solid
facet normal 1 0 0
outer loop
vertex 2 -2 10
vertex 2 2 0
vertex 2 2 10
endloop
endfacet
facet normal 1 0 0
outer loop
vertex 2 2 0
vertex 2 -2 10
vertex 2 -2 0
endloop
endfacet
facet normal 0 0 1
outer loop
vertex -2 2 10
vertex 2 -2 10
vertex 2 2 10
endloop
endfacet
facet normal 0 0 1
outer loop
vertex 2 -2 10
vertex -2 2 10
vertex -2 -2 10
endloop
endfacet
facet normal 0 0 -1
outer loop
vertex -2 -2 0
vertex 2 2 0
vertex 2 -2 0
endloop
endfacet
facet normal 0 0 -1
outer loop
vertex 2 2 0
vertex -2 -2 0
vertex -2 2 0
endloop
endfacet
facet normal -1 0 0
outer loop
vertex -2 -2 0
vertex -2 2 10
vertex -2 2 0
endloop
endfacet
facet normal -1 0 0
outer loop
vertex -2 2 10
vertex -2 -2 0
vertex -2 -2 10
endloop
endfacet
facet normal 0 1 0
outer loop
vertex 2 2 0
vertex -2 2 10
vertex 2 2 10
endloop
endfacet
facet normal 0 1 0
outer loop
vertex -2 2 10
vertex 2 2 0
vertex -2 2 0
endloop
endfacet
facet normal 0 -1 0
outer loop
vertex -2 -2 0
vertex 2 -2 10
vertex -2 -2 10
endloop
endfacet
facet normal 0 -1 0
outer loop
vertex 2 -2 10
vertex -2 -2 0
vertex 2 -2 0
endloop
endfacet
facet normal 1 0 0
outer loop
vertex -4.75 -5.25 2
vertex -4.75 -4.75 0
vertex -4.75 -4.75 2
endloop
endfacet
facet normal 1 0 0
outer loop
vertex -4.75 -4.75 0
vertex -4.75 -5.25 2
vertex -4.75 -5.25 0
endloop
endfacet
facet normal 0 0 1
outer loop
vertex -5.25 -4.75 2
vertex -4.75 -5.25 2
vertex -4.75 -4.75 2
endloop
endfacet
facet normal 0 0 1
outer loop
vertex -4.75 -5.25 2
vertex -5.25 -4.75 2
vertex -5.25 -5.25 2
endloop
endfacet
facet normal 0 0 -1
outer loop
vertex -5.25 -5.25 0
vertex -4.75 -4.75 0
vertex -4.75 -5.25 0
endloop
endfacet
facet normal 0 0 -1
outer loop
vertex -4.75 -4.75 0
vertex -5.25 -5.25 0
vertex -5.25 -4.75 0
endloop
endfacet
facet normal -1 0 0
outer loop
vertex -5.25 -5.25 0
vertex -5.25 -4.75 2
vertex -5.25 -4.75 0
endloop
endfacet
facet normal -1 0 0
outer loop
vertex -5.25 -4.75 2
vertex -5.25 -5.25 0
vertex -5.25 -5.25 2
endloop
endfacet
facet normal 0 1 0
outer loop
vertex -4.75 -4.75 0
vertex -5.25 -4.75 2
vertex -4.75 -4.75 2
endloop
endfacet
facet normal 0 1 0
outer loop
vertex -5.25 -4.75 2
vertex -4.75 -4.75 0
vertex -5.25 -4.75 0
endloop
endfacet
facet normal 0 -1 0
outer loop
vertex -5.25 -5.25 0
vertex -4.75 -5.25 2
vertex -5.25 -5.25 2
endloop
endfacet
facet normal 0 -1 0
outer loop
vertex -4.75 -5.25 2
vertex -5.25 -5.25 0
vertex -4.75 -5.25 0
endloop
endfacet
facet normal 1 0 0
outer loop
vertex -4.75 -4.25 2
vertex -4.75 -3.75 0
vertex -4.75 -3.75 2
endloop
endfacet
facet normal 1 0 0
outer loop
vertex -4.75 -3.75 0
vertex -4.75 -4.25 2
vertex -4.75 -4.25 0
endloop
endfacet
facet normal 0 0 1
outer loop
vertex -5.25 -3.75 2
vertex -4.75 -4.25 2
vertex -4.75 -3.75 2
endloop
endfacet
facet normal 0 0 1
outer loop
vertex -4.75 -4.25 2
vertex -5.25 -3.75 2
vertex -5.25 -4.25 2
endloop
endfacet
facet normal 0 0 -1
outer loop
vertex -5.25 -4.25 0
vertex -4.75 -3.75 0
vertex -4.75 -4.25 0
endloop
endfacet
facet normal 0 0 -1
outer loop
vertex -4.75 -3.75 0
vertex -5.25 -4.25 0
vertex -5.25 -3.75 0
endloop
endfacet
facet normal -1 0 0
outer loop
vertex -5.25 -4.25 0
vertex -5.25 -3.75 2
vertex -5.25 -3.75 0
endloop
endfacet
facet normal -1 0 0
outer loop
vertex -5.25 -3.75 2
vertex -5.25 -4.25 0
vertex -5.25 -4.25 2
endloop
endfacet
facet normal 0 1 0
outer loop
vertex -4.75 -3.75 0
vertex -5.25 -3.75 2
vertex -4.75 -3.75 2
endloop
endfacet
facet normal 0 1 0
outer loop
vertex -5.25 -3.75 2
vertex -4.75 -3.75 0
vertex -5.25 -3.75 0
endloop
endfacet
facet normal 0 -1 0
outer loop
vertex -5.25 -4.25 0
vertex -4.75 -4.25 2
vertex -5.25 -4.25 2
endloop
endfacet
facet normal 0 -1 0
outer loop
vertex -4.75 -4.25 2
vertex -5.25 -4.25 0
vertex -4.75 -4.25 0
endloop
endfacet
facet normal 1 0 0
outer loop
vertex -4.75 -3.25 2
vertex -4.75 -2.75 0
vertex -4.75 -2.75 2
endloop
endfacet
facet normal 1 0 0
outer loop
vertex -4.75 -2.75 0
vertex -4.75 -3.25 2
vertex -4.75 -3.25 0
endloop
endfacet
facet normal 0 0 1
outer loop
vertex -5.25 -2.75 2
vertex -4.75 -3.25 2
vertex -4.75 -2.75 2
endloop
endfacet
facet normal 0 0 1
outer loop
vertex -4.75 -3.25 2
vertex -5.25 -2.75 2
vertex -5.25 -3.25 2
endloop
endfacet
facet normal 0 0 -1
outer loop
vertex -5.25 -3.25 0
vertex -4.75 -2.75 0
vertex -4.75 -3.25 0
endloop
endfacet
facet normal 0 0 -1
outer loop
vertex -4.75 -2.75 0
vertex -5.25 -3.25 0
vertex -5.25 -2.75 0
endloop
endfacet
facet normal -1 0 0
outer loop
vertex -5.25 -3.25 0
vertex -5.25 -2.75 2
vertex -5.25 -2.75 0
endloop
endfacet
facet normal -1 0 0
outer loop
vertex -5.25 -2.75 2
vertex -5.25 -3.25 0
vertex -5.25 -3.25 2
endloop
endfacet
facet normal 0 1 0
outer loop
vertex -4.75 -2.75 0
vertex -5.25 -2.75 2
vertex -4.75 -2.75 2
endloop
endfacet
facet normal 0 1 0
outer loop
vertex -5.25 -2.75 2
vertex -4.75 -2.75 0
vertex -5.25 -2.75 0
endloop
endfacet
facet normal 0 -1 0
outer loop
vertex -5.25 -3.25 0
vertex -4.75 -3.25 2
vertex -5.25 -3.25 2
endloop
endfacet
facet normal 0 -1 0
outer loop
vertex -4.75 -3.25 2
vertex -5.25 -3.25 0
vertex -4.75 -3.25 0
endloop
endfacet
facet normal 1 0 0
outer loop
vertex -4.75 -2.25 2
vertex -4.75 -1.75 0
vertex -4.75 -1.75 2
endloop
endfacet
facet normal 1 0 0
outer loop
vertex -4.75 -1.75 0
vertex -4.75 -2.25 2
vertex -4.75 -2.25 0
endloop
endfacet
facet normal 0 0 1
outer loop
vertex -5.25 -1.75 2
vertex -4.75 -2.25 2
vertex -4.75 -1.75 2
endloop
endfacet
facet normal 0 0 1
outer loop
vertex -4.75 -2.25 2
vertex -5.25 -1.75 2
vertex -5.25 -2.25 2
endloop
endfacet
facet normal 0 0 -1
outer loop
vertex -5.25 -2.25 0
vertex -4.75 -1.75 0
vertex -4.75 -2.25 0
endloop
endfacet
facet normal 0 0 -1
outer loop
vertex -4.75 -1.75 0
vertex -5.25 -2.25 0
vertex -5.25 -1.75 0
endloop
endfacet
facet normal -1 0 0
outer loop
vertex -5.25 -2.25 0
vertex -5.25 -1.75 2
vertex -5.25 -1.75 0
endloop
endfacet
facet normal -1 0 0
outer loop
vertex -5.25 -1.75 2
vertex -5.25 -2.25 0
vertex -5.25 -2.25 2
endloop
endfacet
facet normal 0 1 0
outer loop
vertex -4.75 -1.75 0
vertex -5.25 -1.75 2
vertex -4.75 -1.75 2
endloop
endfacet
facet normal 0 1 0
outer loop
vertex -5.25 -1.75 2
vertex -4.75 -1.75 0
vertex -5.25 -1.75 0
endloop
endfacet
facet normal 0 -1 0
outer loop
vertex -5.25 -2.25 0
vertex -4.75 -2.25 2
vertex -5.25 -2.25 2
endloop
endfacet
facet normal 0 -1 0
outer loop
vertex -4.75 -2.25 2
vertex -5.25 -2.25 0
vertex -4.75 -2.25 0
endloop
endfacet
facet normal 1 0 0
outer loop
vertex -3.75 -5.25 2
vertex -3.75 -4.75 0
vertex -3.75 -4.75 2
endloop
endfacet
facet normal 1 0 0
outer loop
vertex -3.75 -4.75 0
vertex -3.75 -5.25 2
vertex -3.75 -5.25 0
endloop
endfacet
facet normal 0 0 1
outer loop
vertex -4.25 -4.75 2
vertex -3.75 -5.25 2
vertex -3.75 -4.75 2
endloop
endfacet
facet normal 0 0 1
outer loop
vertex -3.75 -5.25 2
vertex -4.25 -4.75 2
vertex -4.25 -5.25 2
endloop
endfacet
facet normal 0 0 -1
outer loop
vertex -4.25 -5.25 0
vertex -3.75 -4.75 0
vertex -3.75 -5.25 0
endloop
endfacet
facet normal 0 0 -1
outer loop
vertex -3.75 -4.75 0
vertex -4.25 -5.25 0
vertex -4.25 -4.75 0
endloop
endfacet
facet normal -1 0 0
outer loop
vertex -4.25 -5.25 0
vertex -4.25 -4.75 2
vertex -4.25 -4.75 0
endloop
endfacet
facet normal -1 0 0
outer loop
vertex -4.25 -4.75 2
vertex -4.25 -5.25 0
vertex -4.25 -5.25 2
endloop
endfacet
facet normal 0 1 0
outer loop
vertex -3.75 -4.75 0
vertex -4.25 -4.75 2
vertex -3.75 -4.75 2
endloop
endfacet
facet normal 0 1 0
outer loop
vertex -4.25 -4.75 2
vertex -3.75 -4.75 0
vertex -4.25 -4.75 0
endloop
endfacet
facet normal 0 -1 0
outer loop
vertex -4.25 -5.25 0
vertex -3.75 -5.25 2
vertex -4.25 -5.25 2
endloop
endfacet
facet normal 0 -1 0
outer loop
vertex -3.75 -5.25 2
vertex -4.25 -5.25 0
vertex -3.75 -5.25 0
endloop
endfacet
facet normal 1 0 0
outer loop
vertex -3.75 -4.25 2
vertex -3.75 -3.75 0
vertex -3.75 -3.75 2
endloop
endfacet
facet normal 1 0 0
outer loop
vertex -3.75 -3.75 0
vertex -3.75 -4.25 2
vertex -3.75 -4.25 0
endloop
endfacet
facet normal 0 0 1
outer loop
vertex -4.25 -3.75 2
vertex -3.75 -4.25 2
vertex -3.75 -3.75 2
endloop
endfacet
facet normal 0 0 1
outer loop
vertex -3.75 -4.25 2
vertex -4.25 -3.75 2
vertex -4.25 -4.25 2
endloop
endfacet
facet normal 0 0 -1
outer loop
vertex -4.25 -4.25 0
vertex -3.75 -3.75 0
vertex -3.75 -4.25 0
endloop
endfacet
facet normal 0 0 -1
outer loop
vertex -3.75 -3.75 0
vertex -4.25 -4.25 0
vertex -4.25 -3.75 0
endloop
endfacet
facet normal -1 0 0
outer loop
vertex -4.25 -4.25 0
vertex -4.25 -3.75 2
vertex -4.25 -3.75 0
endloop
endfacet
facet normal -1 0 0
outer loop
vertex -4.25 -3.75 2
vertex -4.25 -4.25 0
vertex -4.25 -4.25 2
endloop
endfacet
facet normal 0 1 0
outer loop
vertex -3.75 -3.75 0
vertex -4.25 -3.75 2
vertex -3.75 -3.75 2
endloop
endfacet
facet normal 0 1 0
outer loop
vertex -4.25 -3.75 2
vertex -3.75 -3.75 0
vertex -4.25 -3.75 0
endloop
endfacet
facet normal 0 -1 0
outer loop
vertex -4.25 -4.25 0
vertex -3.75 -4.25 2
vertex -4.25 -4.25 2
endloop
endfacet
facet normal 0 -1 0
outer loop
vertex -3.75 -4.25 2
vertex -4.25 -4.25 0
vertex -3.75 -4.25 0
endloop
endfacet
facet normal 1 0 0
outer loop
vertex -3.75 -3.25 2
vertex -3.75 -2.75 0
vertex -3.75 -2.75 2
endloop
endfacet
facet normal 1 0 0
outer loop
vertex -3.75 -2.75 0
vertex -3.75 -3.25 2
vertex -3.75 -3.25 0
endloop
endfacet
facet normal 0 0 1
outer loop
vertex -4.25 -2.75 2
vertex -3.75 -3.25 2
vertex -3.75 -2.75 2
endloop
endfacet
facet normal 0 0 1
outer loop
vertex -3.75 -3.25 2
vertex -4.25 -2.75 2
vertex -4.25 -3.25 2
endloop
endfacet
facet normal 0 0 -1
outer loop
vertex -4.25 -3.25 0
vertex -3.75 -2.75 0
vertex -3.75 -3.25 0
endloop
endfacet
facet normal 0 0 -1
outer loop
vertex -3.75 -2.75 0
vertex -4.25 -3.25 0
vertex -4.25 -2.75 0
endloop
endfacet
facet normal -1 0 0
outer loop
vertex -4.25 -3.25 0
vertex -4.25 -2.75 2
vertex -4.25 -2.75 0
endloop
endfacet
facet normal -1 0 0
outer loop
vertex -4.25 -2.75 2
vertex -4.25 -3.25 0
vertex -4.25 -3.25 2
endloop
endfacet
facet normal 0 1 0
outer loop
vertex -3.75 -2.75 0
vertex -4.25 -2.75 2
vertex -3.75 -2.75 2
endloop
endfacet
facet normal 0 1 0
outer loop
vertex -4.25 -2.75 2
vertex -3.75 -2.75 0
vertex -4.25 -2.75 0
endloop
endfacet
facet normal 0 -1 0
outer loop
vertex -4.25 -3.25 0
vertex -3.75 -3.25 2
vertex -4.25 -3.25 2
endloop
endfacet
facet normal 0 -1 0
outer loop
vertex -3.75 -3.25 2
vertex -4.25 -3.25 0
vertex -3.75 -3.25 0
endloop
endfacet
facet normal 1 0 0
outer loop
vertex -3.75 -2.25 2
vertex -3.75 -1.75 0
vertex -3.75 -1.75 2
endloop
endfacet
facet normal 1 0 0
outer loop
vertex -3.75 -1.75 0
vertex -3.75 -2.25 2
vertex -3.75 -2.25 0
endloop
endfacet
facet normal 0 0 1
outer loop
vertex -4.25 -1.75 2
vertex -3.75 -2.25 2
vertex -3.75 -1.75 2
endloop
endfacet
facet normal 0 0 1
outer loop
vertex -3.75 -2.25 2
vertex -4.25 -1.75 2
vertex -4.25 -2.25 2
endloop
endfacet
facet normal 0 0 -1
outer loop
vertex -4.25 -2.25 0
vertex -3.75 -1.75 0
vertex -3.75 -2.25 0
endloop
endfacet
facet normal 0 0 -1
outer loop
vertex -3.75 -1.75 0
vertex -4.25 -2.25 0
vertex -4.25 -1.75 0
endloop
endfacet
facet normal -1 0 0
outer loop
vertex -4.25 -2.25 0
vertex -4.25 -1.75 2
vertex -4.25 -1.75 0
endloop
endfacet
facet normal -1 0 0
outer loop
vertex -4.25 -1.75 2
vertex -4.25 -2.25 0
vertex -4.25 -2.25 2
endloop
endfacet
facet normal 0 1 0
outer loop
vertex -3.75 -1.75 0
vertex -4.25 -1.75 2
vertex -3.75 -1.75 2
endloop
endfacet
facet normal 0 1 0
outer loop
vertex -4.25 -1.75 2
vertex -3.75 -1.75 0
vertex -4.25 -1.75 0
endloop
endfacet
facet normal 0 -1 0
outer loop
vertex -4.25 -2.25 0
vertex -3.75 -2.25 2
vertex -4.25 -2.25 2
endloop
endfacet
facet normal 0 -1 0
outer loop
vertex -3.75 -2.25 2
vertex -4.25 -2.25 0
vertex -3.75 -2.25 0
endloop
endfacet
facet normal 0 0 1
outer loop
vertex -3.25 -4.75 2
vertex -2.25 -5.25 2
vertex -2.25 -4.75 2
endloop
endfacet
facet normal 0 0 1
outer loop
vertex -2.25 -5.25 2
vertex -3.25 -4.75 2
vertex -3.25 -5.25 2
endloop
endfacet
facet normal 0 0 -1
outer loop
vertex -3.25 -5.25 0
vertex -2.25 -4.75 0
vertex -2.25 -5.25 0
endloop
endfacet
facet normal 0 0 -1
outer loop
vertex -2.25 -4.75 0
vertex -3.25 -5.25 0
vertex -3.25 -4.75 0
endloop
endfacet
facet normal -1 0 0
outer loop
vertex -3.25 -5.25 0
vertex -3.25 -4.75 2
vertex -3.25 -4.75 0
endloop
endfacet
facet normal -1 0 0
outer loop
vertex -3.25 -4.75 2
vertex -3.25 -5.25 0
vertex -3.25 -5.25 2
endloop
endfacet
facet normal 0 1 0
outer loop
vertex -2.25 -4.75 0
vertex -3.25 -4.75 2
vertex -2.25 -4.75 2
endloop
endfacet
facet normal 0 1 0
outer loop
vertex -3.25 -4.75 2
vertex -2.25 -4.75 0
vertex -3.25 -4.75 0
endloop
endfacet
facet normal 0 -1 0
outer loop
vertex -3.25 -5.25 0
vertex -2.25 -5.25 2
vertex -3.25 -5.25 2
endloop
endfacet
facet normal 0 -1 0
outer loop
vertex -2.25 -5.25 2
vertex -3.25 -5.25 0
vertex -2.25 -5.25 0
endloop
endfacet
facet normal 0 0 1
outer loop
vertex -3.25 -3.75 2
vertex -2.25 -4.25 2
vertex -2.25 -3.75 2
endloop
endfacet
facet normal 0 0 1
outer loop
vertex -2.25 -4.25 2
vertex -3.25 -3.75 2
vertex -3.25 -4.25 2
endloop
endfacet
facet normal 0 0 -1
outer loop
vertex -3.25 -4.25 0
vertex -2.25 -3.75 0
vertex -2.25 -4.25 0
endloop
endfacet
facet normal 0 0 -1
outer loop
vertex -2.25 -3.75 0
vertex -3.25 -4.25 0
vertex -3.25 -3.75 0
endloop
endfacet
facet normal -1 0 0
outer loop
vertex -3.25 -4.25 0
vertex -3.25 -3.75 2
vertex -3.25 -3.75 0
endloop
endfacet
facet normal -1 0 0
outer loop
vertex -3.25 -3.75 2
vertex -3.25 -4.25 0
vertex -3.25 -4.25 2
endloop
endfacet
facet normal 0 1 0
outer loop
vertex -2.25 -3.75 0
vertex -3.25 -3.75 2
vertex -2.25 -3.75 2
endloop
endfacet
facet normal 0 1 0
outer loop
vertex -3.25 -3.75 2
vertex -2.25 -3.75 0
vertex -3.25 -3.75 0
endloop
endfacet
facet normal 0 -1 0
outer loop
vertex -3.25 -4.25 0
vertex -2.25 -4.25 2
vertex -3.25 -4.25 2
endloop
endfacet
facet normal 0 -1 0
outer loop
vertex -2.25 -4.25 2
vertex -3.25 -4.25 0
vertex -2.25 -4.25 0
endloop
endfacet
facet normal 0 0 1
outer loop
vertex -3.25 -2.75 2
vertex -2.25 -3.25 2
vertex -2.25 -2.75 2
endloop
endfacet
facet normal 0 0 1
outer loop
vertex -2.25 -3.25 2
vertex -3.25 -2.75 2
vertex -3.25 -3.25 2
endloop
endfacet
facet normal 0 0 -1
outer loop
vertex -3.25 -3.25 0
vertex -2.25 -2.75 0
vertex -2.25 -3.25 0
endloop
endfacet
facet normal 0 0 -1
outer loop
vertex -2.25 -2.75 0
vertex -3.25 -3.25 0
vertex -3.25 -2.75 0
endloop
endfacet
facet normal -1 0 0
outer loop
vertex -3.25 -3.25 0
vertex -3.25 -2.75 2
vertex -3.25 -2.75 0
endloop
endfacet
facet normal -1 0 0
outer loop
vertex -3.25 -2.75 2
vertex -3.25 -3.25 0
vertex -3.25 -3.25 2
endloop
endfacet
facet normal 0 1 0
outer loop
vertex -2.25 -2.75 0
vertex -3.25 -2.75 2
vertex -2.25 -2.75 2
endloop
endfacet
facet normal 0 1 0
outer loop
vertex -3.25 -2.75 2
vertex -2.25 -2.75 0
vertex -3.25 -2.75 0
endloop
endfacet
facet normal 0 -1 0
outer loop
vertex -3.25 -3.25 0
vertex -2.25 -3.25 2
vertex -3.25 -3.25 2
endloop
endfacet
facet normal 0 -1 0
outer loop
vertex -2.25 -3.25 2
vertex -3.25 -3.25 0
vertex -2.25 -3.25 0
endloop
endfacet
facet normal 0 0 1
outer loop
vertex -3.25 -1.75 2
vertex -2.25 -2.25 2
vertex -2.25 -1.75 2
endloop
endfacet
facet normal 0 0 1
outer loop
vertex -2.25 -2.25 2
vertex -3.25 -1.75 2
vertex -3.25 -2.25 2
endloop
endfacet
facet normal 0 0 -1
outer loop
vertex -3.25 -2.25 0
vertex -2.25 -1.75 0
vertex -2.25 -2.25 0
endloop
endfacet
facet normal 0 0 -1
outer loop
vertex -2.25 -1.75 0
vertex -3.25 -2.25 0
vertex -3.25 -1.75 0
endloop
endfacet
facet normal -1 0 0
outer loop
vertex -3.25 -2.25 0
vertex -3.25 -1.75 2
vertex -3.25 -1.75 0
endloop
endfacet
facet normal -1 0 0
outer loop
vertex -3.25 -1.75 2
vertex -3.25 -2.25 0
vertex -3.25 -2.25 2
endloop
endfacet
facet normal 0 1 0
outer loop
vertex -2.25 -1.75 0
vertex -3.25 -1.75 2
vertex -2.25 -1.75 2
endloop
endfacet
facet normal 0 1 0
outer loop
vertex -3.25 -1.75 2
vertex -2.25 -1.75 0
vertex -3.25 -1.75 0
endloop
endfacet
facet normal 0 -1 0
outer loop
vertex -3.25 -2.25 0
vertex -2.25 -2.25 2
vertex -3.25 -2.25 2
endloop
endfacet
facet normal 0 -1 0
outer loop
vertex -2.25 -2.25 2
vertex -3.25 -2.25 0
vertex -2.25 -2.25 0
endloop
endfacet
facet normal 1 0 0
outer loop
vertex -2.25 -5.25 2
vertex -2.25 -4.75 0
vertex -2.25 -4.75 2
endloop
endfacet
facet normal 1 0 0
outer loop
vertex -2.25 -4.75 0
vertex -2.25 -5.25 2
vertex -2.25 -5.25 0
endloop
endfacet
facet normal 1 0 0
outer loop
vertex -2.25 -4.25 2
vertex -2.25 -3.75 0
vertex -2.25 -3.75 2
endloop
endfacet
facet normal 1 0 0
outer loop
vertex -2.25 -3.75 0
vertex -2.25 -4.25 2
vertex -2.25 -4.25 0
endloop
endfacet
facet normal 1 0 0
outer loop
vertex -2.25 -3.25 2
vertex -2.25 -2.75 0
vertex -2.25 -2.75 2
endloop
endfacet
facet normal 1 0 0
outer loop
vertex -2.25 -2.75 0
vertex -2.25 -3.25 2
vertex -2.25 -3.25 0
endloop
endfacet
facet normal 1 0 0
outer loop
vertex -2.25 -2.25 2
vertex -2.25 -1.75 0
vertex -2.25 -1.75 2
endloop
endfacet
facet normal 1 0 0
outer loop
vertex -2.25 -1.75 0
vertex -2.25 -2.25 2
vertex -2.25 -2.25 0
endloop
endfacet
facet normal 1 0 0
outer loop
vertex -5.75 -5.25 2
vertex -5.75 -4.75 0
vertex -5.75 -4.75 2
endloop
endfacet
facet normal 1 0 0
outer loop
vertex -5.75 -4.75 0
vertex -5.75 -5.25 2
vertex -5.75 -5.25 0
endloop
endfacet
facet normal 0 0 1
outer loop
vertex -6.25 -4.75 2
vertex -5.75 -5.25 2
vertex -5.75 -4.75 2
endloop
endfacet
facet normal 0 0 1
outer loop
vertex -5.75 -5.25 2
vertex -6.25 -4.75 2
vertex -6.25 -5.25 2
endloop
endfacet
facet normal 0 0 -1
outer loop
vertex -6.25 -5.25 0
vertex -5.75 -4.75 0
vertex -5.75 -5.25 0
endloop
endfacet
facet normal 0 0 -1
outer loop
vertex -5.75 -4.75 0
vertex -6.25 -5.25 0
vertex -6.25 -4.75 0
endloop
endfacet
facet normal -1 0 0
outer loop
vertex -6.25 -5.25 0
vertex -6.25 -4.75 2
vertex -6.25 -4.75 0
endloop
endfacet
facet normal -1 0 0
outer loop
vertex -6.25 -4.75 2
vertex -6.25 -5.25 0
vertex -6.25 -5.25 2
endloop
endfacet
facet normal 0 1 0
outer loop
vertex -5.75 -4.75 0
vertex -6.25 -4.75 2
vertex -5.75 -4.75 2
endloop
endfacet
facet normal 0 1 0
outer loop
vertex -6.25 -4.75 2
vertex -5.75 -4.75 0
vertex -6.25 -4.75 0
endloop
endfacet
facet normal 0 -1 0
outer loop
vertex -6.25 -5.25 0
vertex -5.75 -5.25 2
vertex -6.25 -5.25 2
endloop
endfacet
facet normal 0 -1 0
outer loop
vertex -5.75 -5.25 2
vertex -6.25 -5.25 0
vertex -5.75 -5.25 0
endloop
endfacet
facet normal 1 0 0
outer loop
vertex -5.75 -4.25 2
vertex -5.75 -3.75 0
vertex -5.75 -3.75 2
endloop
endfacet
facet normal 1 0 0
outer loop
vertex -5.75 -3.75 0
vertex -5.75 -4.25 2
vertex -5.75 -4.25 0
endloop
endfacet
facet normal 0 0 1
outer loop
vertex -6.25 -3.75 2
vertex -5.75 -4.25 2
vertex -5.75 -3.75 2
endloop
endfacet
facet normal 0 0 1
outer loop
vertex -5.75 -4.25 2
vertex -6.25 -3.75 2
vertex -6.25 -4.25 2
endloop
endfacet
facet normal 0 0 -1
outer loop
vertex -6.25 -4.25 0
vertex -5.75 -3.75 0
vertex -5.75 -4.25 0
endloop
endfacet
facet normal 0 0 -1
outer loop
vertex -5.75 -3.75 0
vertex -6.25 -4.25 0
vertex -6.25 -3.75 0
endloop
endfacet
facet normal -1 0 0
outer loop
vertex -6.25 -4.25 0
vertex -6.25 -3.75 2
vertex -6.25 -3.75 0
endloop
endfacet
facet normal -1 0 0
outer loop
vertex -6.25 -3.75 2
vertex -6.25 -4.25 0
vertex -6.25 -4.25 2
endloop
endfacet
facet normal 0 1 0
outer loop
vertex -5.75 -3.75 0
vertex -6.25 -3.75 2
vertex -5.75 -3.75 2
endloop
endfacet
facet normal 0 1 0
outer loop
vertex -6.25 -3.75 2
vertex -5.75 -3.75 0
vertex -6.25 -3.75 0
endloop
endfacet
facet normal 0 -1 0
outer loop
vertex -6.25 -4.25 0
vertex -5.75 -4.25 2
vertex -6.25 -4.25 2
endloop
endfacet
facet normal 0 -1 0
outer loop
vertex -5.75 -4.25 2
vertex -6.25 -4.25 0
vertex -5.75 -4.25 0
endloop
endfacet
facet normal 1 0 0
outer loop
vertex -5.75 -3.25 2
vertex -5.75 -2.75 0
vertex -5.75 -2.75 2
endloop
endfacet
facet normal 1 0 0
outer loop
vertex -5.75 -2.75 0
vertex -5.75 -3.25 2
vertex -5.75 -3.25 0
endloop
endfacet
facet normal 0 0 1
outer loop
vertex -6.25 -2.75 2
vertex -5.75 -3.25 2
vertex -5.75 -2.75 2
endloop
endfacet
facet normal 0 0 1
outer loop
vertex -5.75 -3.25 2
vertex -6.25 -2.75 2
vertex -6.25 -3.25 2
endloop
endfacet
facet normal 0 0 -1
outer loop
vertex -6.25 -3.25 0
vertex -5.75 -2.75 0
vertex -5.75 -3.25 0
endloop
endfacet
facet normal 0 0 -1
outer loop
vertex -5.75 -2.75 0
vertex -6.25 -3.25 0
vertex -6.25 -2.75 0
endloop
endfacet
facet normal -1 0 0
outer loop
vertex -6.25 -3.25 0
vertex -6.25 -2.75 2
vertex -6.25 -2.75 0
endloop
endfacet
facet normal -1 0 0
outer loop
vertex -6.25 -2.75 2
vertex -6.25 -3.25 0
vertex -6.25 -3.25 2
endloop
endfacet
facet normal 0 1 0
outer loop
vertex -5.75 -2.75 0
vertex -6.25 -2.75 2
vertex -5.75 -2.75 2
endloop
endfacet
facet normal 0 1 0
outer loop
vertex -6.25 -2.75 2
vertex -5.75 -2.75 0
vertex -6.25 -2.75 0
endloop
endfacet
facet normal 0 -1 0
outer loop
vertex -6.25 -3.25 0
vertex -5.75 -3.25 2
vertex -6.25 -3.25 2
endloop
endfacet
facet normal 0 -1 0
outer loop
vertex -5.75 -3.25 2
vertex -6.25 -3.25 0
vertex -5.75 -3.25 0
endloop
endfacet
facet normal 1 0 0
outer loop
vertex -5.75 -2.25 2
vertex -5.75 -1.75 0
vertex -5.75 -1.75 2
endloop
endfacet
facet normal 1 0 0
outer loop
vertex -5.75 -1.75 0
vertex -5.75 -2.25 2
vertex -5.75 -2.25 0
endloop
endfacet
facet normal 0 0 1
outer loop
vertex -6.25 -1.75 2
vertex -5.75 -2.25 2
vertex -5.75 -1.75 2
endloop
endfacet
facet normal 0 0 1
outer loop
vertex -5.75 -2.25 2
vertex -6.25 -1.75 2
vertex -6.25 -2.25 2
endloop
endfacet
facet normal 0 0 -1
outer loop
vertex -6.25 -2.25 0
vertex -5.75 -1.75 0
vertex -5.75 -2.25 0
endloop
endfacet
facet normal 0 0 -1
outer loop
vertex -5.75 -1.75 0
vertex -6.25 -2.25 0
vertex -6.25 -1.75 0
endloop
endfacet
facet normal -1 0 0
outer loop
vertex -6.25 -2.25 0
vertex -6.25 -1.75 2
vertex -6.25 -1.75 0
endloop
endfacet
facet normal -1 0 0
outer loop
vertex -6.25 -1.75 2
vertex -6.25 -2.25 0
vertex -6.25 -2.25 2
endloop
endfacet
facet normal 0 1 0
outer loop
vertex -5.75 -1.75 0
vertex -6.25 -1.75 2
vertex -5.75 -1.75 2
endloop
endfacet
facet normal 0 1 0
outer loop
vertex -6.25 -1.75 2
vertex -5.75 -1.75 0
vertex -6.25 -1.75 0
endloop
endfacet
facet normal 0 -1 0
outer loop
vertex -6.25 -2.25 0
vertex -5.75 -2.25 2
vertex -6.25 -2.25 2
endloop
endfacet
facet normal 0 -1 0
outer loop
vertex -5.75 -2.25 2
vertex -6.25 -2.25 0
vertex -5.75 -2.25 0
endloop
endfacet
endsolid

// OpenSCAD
translate([0, 0, 5]) color([0,1,0,0.9]) cube([4, 4, 10], center=true);
translate([-5.0, -5.0, 1]) color([1,0,0]) cube([0.5, 0.5, 2], center=true);
translate([-5.0, -4.0, 1]) color([1,0,0]) cube([0.5, 0.5, 2], center=true);
translate([-5.0, -3.0, 1]) color([1,0,0]) cube([0.5, 0.5, 2], center=true);
translate([-5.0, -2.0, 1]) color([1,0,0]) cube([0.5, 0.5, 2], center=true);
translate([-4.0, -5.0, 1]) color([1,0,0]) cube([0.5, 0.5, 2], center=true);
translate([-4.0, -4.0, 1]) color([1,0,0]) cube([0.5, 0.5, 2], center=true);
translate([-4.0, -3.0, 1]) color([1,0,0]) cube([0.5, 0.5, 2], center=true);
translate([-4.0, -2.0, 1]) color([1,0,0]) cube([0.5, 0.5, 2], center=true);
translate([-3.0, -5.0, 1]) color([1,0,0]) cube([0.5, 0.5, 2], center=true);
translate([-3.0, -4.0, 1]) color([1,0,0]) cube([0.5, 0.5, 2], center=true);
translate([-3.0, -3.0, 1]) color([1,0,0]) cube([0.5, 0.5, 2], center=true);
translate([-3.0, -2.0, 1]) color([1,0,0]) cube([0.5, 0.5, 2], center=true);
translate([-2.5, -5.0, 1]) color([1,0,0]) cube([0.5, 0.5, 2], center=true);
translate([-2.5, -4.0, 1]) color([1,0,0]) cube([0.5, 0.5, 2], center=true);
translate([-2.5, -3.0, 1]) color([1,0,0]) cube([0.5, 0.5, 2], center=true);
translate([-2.5, -2.0, 1]) color([1,0,0]) cube([0.5, 0.5, 2], center=true);
translate([-6.0, -5.0, 1]) color([1,0,0]) cube([0.5, 0.5, 2], center=true);
translate([-6.0, -4.0, 1]) color([1,0,0]) cube([0.5, 0.5, 2], center=true);
translate([-6.0, -3.0, 1]) color([1,0,0]) cube([0.5, 0.5, 2], center=true);
translate([-6.0, -2.0, 1]) color([1,0,0]) cube([0.5, 0.5, 2], center=true);
